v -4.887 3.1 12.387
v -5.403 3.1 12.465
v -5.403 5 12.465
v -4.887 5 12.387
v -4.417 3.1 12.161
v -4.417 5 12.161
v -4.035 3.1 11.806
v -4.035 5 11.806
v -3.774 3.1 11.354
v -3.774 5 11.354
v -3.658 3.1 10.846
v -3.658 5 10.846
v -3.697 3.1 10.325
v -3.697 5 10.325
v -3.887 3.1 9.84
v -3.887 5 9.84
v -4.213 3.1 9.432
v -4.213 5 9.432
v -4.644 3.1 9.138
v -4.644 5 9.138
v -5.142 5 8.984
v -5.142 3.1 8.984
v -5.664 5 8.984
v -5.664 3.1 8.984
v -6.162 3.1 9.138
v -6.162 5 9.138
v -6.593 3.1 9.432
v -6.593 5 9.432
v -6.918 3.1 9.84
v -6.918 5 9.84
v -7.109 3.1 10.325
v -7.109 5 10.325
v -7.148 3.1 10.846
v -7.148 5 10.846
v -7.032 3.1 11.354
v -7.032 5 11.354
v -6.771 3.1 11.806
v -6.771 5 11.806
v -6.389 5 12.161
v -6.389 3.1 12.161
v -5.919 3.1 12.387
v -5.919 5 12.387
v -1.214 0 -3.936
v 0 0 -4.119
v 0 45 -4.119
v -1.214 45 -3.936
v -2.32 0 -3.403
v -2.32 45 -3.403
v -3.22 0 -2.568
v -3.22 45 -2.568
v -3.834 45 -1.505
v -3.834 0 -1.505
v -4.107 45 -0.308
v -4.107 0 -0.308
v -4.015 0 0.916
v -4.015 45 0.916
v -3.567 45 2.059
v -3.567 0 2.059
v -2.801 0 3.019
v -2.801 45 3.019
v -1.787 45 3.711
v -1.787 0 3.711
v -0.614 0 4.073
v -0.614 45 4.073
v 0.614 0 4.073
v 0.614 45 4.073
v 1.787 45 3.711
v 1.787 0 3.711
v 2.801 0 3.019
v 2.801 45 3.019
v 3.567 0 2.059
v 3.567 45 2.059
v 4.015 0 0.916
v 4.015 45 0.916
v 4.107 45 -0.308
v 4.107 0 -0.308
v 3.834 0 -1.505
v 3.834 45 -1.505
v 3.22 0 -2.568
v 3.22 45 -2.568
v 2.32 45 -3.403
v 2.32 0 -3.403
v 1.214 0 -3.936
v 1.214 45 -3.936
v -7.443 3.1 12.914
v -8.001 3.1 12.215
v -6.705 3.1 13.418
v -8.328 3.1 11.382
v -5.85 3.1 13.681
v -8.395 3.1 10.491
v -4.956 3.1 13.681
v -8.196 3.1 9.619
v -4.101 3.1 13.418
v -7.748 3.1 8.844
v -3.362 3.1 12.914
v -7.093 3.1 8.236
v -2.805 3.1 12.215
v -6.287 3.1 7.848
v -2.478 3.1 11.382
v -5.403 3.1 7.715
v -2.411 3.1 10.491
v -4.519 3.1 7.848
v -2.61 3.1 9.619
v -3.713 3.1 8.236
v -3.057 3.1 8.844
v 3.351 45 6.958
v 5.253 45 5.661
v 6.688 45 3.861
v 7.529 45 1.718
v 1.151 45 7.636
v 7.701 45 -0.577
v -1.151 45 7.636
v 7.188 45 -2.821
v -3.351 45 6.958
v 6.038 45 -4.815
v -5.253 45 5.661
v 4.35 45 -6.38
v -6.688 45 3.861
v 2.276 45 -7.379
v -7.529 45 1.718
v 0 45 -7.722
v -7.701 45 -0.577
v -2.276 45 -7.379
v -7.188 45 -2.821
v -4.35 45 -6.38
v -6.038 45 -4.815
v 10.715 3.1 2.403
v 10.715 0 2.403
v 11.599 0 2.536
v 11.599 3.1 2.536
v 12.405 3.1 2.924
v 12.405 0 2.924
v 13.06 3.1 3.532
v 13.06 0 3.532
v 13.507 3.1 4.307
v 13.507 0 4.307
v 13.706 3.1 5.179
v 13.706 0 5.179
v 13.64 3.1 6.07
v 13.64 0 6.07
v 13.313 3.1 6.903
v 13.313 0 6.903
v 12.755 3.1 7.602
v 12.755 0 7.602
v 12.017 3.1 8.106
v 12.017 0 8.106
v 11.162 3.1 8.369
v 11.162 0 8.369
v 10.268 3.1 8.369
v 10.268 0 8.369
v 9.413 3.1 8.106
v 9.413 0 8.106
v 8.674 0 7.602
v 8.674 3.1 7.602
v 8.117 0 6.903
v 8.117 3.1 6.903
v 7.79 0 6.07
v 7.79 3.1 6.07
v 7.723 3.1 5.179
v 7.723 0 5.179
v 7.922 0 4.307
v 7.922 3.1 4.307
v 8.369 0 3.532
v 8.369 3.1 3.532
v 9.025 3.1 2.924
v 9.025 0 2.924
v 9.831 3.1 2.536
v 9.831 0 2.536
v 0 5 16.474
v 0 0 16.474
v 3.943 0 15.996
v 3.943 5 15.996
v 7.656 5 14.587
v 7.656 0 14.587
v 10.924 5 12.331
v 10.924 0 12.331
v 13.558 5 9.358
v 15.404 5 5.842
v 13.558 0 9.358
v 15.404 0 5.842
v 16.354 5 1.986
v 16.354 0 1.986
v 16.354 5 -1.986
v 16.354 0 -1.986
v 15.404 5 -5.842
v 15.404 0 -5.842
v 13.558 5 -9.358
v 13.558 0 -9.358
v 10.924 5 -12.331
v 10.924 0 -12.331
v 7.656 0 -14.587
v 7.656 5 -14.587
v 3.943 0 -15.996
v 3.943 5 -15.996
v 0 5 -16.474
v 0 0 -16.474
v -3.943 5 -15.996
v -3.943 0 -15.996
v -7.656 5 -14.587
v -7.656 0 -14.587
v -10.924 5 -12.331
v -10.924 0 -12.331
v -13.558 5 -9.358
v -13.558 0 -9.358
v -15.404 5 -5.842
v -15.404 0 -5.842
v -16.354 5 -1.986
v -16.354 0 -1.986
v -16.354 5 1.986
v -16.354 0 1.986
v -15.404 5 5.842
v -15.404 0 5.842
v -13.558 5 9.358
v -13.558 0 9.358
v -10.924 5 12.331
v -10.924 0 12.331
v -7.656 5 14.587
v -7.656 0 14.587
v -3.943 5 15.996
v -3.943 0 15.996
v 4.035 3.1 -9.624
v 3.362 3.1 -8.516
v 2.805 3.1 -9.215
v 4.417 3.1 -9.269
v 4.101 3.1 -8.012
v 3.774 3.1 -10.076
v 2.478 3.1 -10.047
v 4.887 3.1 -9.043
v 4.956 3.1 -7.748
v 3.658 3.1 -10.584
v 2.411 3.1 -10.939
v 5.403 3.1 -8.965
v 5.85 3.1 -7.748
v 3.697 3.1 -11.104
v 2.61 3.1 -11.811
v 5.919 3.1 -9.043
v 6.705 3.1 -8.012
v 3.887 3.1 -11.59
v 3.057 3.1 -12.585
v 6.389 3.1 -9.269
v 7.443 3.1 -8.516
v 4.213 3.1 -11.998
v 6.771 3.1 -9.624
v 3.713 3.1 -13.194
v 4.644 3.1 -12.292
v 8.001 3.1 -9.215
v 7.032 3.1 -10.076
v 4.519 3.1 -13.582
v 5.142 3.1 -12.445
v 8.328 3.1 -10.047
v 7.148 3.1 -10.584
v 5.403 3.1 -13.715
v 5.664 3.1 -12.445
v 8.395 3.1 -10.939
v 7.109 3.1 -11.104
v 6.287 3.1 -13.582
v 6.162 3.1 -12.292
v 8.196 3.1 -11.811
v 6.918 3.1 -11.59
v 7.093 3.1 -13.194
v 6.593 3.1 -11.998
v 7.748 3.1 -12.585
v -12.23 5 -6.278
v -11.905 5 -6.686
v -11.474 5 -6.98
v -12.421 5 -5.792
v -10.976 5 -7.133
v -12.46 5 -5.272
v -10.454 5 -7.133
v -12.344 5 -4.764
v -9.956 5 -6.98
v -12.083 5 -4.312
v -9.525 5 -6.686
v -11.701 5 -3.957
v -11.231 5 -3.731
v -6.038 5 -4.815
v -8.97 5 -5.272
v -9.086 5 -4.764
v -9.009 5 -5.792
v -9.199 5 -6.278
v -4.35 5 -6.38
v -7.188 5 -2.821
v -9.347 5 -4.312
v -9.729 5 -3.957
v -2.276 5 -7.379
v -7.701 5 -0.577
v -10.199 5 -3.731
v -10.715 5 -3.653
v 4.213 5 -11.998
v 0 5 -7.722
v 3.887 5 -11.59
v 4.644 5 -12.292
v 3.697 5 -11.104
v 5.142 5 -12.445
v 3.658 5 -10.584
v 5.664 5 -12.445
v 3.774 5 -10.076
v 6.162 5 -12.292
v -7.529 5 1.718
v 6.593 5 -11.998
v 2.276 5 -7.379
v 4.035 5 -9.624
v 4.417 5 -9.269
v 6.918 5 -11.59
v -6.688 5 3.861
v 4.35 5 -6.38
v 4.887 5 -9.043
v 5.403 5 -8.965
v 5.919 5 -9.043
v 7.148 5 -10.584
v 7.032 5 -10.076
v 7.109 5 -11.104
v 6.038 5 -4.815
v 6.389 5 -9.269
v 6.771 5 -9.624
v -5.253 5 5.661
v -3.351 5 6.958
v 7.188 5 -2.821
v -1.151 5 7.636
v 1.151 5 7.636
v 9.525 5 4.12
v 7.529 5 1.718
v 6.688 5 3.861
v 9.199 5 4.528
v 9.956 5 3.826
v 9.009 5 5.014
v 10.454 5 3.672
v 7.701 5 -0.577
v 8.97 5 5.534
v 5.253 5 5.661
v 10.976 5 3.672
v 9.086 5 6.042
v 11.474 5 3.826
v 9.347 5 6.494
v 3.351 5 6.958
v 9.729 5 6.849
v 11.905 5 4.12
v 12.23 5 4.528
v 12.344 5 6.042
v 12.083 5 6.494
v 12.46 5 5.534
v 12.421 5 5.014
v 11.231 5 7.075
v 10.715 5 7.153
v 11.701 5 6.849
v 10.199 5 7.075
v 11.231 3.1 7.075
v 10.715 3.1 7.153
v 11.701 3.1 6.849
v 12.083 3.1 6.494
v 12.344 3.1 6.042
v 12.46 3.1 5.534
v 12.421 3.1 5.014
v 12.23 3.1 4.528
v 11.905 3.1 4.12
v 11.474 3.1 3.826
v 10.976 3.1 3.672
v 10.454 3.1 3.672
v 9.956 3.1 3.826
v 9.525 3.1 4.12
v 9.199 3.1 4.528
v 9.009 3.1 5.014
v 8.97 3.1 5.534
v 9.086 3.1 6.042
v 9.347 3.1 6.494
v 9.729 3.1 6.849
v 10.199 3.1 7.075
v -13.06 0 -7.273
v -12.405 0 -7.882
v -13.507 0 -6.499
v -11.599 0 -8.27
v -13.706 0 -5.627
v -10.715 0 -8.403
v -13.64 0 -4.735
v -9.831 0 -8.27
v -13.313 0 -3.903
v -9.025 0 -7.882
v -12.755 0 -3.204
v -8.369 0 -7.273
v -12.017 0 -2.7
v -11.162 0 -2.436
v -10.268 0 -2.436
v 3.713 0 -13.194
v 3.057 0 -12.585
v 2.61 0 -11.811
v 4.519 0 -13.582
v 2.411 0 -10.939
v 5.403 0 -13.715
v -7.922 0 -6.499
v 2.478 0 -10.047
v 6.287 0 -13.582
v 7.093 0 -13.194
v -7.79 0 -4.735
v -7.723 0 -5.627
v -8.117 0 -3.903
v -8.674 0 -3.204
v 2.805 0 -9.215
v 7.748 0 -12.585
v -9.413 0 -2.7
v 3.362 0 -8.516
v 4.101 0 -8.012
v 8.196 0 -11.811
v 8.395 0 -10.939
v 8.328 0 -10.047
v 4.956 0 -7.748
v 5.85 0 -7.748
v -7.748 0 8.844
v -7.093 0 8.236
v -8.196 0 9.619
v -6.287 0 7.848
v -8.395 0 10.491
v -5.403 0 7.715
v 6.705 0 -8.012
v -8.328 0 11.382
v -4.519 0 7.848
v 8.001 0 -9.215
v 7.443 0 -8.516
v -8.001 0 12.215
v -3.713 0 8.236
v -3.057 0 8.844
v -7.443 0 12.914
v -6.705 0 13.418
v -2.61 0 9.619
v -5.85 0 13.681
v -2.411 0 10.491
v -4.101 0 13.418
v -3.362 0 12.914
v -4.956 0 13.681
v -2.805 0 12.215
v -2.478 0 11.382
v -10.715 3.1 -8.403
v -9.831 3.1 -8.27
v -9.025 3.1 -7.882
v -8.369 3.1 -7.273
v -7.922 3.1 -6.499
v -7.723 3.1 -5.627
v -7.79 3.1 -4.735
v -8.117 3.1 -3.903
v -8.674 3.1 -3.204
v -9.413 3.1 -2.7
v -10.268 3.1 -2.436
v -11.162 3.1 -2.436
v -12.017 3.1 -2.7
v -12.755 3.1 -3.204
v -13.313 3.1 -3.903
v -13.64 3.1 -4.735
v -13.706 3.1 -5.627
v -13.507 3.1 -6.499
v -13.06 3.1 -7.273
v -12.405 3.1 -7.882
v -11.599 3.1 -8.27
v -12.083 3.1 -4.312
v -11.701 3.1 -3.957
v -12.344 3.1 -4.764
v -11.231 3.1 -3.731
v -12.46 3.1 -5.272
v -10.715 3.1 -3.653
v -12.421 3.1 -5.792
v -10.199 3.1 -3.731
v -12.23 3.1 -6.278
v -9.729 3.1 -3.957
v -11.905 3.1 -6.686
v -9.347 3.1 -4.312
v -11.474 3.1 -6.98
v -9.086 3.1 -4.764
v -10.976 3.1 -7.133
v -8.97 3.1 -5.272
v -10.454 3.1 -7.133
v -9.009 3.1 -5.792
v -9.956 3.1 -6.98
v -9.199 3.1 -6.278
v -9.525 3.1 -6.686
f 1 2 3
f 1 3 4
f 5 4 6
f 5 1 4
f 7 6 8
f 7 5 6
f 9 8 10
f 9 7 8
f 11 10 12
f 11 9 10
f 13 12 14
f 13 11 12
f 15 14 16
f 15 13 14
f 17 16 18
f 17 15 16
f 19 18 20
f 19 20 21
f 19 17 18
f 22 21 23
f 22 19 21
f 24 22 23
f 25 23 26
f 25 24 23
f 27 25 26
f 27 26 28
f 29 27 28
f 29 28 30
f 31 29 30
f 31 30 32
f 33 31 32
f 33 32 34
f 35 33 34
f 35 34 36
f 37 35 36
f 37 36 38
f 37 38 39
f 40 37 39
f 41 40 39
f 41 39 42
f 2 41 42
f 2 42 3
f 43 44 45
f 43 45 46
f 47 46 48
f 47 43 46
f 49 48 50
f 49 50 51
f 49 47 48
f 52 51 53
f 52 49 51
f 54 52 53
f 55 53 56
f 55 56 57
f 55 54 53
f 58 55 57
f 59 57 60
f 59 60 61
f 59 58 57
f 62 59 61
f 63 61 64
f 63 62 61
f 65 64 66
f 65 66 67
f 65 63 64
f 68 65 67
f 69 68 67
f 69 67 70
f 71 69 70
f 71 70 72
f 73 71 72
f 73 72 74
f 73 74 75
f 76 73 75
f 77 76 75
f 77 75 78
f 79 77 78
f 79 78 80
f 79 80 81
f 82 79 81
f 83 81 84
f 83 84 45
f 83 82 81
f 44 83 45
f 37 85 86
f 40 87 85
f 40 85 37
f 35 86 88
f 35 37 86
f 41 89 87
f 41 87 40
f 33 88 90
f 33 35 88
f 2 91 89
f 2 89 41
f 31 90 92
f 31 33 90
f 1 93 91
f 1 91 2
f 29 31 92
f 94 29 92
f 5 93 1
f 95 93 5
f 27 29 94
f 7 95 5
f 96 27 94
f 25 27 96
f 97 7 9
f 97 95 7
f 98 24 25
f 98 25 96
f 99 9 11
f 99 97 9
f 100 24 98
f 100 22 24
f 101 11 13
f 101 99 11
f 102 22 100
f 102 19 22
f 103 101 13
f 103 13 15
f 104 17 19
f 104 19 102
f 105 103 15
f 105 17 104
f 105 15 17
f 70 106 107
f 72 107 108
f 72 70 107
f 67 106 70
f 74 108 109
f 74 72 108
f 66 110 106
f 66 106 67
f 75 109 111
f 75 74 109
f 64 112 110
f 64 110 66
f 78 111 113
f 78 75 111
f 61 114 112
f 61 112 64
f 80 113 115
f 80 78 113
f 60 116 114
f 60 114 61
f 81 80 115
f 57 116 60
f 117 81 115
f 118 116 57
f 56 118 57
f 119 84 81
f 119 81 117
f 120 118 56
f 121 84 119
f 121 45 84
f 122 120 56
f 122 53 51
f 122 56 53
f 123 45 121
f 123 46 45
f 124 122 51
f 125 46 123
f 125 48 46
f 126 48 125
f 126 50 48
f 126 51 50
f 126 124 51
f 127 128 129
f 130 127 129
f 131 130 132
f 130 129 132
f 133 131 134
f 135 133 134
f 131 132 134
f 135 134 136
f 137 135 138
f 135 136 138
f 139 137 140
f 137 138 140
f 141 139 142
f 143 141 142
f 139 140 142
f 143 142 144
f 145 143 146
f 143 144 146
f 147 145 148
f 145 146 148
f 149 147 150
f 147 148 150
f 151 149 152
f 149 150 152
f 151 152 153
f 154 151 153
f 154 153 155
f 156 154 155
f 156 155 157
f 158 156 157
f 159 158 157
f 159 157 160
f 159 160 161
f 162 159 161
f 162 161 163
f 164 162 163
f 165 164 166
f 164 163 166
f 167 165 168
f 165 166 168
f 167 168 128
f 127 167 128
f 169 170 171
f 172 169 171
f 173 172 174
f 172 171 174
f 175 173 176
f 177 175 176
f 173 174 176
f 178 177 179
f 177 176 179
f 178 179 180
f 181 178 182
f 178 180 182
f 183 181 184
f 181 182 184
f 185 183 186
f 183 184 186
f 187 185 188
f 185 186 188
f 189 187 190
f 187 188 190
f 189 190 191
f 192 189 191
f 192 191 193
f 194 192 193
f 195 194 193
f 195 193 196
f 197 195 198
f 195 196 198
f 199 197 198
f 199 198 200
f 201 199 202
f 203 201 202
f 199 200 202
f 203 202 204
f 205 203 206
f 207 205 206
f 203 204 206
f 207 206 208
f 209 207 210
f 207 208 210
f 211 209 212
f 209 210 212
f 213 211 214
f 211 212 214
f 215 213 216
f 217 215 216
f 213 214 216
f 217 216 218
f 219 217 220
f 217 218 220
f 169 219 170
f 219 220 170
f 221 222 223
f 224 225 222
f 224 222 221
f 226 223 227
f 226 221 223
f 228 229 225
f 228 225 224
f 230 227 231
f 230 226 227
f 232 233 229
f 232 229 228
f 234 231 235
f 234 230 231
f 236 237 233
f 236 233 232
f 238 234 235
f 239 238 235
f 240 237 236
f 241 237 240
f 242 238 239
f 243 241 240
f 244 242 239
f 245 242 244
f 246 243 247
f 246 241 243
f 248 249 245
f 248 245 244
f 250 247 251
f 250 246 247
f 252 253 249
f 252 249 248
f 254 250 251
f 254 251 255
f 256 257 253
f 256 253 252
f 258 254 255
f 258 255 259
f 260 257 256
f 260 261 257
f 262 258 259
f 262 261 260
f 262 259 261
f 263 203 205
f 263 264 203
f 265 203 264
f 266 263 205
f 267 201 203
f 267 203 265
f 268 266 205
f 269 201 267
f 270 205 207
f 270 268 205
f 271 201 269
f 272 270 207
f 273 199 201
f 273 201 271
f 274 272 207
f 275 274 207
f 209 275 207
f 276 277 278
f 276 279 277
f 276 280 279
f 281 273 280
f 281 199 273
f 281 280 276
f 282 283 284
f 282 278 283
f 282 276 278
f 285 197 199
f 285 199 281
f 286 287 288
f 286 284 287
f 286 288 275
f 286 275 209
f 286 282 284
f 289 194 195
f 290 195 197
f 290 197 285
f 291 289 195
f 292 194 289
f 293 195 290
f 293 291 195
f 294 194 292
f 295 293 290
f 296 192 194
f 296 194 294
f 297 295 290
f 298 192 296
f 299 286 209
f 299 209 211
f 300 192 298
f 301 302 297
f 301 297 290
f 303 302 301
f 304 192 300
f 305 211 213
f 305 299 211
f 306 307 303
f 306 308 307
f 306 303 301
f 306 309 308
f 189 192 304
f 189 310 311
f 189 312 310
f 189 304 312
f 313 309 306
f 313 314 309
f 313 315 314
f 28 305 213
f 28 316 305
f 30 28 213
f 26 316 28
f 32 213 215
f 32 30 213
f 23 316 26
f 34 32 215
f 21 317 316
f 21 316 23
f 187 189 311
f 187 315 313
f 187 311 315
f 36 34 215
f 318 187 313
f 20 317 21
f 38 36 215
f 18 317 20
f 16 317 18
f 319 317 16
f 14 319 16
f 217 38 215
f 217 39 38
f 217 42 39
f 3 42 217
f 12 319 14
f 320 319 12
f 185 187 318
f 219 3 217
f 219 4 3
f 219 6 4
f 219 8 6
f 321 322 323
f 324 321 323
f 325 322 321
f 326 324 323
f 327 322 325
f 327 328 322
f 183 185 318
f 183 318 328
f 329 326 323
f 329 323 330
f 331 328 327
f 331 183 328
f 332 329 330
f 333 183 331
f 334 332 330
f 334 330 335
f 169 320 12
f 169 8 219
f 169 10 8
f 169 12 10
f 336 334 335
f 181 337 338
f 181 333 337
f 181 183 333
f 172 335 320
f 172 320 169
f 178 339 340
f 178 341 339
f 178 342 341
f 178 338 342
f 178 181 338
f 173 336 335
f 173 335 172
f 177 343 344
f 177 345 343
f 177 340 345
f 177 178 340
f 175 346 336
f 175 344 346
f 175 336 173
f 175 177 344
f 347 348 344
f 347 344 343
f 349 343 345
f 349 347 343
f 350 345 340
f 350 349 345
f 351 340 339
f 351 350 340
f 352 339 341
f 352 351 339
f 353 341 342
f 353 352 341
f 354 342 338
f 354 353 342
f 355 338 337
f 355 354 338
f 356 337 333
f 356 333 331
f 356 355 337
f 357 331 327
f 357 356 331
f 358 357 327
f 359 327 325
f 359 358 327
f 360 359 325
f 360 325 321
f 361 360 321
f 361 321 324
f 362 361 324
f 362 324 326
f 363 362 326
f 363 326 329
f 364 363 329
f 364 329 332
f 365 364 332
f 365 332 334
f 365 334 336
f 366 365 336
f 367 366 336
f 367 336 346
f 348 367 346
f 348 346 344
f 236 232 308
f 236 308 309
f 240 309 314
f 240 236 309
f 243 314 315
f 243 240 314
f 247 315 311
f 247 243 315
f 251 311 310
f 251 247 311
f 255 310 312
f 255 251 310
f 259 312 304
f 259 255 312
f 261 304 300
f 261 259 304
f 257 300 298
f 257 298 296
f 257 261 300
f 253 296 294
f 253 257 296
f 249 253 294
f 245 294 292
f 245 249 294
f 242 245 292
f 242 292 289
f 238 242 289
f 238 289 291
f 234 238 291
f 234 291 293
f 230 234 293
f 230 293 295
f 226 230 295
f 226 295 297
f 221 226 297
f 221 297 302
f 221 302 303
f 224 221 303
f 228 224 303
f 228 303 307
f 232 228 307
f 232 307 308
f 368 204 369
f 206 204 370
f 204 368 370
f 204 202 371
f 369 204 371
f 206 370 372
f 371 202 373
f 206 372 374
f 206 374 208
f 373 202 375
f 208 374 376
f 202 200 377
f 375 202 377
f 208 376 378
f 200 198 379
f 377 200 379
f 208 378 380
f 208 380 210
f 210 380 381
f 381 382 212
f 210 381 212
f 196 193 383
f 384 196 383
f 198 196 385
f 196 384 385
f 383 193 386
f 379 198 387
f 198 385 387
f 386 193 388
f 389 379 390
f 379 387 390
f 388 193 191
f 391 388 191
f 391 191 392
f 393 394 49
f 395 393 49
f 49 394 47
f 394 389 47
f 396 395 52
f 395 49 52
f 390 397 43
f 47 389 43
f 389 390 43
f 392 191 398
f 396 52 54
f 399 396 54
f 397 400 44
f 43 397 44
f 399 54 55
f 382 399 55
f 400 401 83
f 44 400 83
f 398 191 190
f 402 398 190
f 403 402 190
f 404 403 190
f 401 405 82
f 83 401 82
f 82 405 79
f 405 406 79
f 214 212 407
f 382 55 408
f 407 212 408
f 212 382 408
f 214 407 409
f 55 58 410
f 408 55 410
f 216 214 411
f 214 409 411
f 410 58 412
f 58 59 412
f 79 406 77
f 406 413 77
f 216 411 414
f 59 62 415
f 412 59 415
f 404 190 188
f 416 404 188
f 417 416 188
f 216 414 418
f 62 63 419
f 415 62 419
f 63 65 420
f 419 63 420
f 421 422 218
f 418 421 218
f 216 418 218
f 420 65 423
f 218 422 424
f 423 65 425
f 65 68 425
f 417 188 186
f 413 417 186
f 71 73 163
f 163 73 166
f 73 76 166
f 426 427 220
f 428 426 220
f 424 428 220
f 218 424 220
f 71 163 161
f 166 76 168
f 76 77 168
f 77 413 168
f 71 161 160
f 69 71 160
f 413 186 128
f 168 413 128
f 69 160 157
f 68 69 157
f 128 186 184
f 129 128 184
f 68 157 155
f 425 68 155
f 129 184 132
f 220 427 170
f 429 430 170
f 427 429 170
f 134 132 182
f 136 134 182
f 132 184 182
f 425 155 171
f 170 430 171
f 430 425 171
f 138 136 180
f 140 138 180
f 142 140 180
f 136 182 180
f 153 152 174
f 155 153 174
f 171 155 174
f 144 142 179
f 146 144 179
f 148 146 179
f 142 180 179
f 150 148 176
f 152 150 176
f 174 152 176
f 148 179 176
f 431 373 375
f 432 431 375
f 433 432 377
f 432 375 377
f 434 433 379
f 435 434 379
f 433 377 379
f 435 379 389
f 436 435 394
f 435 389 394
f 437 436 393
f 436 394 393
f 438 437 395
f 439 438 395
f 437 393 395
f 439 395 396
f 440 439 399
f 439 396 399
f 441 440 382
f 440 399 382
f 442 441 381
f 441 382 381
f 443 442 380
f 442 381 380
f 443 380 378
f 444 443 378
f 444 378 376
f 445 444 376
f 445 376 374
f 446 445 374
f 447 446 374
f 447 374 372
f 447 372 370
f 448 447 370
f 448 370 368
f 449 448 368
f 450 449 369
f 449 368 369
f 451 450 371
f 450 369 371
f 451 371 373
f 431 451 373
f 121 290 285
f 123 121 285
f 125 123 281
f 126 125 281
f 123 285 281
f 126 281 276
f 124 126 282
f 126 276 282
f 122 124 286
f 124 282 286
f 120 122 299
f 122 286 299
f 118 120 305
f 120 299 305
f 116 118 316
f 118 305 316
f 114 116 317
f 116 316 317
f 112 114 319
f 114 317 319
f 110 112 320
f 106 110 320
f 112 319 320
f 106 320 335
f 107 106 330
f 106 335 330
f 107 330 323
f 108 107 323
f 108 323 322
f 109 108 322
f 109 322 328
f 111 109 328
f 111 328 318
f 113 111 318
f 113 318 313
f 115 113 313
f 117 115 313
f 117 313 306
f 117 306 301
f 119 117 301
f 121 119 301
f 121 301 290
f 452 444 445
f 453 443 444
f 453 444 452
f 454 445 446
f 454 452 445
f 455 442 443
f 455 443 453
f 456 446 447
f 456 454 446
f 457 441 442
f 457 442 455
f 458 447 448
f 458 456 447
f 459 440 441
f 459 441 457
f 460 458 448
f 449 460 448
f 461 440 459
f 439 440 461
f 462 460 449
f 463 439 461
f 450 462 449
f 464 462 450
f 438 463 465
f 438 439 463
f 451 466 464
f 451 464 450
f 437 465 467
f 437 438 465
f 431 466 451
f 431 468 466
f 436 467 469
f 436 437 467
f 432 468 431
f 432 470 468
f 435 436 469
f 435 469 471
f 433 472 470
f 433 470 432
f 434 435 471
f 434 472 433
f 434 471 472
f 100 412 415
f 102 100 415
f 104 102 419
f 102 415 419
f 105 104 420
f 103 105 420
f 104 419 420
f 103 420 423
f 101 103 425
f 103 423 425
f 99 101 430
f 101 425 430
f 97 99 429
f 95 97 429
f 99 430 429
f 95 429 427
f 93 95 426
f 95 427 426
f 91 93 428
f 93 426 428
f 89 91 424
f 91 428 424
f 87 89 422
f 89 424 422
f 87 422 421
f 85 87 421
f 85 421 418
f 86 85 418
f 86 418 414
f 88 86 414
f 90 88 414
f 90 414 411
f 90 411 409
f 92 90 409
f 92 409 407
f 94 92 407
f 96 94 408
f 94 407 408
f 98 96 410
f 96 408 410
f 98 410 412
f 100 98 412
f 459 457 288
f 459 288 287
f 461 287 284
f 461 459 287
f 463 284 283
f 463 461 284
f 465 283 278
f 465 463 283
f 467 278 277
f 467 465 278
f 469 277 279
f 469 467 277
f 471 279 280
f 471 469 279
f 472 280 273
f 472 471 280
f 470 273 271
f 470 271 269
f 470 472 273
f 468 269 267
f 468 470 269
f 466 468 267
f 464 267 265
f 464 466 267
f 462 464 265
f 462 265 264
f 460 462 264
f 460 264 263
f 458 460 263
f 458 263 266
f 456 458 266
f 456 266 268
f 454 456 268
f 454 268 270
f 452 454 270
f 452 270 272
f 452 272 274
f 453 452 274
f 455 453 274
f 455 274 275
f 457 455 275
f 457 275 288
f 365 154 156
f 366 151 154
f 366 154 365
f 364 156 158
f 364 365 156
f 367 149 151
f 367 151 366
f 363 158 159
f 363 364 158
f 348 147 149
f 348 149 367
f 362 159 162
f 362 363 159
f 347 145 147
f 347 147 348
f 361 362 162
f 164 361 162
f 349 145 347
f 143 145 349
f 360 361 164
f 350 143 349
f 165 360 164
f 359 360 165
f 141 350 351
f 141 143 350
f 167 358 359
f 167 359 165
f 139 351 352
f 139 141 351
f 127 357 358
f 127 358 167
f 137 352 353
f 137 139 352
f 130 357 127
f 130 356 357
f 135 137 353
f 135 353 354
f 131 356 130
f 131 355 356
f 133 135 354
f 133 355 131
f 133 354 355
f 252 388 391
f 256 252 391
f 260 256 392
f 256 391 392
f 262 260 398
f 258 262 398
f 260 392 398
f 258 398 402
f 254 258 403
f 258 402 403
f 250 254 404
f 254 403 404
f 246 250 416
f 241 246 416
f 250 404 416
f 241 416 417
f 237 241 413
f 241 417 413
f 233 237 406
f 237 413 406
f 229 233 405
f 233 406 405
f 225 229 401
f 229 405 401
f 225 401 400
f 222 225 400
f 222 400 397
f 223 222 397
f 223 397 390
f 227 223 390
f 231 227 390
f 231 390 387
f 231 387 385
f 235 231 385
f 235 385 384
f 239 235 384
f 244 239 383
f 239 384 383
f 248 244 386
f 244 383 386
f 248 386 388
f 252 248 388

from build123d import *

# Parameters (mm, degrees)
SKETCH_1_R          = 16.47426238
SKETCH_1_R_2        = 1.75
SKETCH_1_R_3        = 7.722310491
EXTRUDE_1_DEPTH     = 5
SKETCH_1_3_R        = 7.722310491
SKETCH_1_3_R_2      = 4.118565595
EXTRUDE_2_DEPTH     = 45
SKETCH_2_R          = 3
CUT_EXTRUDE_1_DEPTH = 3.1


with BuildPart() as part:
    # 草图1 → 凸台-拉伸1 (new body)
    with BuildSketch(Plane(origin=(0, 0, 0), x_dir=(1, 0, 0), z_dir=(0, 1, 0))):
        Circle(SKETCH_1_R)
        with Locations((-5.402922146, -10.714869681)):
            Circle(SKETCH_1_R_2, mode=Mode.SUBTRACT)
        with Locations((10.714869681, -5.402922146)):
            Circle(SKETCH_1_R_2, mode=Mode.SUBTRACT)
        with Locations((-10.714869681, 5.402922146)):
            Circle(SKETCH_1_R_2, mode=Mode.SUBTRACT)
        Circle(SKETCH_1_R_3, mode=Mode.SUBTRACT)
        with Locations((5.402922146, 10.714869681)):
            Circle(SKETCH_1_R_2, mode=Mode.SUBTRACT)
    extrude(amount=EXTRUDE_1_DEPTH)

    # 草图1<3> → 凸台-拉伸2 (add)
    with BuildSketch(Plane(origin=(0, 0, 0), x_dir=(1, 0, 0), z_dir=(0, 1, 0))):
        Circle(SKETCH_1_3_R)
        Circle(SKETCH_1_3_R_2, mode=Mode.SUBTRACT)
    extrude(amount=EXTRUDE_2_DEPTH)

    # 草图2 → 切除-拉伸1 (cut)
    with BuildSketch(Plane.XZ):
        with Locations((5.402922146, -10.714869681)):
            Circle(SKETCH_2_R)
        with Locations((-10.714869681, -5.402922146)):
            Circle(SKETCH_2_R)
        with Locations((-5.402922146, 10.714869681)):
            Circle(SKETCH_2_R)
        with Locations((10.714869681, 5.402922146)):
            Circle(SKETCH_2_R)
    extrude(amount=-CUT_EXTRUDE_1_DEPTH, mode=Mode.SUBTRACT)


solid = part.part
